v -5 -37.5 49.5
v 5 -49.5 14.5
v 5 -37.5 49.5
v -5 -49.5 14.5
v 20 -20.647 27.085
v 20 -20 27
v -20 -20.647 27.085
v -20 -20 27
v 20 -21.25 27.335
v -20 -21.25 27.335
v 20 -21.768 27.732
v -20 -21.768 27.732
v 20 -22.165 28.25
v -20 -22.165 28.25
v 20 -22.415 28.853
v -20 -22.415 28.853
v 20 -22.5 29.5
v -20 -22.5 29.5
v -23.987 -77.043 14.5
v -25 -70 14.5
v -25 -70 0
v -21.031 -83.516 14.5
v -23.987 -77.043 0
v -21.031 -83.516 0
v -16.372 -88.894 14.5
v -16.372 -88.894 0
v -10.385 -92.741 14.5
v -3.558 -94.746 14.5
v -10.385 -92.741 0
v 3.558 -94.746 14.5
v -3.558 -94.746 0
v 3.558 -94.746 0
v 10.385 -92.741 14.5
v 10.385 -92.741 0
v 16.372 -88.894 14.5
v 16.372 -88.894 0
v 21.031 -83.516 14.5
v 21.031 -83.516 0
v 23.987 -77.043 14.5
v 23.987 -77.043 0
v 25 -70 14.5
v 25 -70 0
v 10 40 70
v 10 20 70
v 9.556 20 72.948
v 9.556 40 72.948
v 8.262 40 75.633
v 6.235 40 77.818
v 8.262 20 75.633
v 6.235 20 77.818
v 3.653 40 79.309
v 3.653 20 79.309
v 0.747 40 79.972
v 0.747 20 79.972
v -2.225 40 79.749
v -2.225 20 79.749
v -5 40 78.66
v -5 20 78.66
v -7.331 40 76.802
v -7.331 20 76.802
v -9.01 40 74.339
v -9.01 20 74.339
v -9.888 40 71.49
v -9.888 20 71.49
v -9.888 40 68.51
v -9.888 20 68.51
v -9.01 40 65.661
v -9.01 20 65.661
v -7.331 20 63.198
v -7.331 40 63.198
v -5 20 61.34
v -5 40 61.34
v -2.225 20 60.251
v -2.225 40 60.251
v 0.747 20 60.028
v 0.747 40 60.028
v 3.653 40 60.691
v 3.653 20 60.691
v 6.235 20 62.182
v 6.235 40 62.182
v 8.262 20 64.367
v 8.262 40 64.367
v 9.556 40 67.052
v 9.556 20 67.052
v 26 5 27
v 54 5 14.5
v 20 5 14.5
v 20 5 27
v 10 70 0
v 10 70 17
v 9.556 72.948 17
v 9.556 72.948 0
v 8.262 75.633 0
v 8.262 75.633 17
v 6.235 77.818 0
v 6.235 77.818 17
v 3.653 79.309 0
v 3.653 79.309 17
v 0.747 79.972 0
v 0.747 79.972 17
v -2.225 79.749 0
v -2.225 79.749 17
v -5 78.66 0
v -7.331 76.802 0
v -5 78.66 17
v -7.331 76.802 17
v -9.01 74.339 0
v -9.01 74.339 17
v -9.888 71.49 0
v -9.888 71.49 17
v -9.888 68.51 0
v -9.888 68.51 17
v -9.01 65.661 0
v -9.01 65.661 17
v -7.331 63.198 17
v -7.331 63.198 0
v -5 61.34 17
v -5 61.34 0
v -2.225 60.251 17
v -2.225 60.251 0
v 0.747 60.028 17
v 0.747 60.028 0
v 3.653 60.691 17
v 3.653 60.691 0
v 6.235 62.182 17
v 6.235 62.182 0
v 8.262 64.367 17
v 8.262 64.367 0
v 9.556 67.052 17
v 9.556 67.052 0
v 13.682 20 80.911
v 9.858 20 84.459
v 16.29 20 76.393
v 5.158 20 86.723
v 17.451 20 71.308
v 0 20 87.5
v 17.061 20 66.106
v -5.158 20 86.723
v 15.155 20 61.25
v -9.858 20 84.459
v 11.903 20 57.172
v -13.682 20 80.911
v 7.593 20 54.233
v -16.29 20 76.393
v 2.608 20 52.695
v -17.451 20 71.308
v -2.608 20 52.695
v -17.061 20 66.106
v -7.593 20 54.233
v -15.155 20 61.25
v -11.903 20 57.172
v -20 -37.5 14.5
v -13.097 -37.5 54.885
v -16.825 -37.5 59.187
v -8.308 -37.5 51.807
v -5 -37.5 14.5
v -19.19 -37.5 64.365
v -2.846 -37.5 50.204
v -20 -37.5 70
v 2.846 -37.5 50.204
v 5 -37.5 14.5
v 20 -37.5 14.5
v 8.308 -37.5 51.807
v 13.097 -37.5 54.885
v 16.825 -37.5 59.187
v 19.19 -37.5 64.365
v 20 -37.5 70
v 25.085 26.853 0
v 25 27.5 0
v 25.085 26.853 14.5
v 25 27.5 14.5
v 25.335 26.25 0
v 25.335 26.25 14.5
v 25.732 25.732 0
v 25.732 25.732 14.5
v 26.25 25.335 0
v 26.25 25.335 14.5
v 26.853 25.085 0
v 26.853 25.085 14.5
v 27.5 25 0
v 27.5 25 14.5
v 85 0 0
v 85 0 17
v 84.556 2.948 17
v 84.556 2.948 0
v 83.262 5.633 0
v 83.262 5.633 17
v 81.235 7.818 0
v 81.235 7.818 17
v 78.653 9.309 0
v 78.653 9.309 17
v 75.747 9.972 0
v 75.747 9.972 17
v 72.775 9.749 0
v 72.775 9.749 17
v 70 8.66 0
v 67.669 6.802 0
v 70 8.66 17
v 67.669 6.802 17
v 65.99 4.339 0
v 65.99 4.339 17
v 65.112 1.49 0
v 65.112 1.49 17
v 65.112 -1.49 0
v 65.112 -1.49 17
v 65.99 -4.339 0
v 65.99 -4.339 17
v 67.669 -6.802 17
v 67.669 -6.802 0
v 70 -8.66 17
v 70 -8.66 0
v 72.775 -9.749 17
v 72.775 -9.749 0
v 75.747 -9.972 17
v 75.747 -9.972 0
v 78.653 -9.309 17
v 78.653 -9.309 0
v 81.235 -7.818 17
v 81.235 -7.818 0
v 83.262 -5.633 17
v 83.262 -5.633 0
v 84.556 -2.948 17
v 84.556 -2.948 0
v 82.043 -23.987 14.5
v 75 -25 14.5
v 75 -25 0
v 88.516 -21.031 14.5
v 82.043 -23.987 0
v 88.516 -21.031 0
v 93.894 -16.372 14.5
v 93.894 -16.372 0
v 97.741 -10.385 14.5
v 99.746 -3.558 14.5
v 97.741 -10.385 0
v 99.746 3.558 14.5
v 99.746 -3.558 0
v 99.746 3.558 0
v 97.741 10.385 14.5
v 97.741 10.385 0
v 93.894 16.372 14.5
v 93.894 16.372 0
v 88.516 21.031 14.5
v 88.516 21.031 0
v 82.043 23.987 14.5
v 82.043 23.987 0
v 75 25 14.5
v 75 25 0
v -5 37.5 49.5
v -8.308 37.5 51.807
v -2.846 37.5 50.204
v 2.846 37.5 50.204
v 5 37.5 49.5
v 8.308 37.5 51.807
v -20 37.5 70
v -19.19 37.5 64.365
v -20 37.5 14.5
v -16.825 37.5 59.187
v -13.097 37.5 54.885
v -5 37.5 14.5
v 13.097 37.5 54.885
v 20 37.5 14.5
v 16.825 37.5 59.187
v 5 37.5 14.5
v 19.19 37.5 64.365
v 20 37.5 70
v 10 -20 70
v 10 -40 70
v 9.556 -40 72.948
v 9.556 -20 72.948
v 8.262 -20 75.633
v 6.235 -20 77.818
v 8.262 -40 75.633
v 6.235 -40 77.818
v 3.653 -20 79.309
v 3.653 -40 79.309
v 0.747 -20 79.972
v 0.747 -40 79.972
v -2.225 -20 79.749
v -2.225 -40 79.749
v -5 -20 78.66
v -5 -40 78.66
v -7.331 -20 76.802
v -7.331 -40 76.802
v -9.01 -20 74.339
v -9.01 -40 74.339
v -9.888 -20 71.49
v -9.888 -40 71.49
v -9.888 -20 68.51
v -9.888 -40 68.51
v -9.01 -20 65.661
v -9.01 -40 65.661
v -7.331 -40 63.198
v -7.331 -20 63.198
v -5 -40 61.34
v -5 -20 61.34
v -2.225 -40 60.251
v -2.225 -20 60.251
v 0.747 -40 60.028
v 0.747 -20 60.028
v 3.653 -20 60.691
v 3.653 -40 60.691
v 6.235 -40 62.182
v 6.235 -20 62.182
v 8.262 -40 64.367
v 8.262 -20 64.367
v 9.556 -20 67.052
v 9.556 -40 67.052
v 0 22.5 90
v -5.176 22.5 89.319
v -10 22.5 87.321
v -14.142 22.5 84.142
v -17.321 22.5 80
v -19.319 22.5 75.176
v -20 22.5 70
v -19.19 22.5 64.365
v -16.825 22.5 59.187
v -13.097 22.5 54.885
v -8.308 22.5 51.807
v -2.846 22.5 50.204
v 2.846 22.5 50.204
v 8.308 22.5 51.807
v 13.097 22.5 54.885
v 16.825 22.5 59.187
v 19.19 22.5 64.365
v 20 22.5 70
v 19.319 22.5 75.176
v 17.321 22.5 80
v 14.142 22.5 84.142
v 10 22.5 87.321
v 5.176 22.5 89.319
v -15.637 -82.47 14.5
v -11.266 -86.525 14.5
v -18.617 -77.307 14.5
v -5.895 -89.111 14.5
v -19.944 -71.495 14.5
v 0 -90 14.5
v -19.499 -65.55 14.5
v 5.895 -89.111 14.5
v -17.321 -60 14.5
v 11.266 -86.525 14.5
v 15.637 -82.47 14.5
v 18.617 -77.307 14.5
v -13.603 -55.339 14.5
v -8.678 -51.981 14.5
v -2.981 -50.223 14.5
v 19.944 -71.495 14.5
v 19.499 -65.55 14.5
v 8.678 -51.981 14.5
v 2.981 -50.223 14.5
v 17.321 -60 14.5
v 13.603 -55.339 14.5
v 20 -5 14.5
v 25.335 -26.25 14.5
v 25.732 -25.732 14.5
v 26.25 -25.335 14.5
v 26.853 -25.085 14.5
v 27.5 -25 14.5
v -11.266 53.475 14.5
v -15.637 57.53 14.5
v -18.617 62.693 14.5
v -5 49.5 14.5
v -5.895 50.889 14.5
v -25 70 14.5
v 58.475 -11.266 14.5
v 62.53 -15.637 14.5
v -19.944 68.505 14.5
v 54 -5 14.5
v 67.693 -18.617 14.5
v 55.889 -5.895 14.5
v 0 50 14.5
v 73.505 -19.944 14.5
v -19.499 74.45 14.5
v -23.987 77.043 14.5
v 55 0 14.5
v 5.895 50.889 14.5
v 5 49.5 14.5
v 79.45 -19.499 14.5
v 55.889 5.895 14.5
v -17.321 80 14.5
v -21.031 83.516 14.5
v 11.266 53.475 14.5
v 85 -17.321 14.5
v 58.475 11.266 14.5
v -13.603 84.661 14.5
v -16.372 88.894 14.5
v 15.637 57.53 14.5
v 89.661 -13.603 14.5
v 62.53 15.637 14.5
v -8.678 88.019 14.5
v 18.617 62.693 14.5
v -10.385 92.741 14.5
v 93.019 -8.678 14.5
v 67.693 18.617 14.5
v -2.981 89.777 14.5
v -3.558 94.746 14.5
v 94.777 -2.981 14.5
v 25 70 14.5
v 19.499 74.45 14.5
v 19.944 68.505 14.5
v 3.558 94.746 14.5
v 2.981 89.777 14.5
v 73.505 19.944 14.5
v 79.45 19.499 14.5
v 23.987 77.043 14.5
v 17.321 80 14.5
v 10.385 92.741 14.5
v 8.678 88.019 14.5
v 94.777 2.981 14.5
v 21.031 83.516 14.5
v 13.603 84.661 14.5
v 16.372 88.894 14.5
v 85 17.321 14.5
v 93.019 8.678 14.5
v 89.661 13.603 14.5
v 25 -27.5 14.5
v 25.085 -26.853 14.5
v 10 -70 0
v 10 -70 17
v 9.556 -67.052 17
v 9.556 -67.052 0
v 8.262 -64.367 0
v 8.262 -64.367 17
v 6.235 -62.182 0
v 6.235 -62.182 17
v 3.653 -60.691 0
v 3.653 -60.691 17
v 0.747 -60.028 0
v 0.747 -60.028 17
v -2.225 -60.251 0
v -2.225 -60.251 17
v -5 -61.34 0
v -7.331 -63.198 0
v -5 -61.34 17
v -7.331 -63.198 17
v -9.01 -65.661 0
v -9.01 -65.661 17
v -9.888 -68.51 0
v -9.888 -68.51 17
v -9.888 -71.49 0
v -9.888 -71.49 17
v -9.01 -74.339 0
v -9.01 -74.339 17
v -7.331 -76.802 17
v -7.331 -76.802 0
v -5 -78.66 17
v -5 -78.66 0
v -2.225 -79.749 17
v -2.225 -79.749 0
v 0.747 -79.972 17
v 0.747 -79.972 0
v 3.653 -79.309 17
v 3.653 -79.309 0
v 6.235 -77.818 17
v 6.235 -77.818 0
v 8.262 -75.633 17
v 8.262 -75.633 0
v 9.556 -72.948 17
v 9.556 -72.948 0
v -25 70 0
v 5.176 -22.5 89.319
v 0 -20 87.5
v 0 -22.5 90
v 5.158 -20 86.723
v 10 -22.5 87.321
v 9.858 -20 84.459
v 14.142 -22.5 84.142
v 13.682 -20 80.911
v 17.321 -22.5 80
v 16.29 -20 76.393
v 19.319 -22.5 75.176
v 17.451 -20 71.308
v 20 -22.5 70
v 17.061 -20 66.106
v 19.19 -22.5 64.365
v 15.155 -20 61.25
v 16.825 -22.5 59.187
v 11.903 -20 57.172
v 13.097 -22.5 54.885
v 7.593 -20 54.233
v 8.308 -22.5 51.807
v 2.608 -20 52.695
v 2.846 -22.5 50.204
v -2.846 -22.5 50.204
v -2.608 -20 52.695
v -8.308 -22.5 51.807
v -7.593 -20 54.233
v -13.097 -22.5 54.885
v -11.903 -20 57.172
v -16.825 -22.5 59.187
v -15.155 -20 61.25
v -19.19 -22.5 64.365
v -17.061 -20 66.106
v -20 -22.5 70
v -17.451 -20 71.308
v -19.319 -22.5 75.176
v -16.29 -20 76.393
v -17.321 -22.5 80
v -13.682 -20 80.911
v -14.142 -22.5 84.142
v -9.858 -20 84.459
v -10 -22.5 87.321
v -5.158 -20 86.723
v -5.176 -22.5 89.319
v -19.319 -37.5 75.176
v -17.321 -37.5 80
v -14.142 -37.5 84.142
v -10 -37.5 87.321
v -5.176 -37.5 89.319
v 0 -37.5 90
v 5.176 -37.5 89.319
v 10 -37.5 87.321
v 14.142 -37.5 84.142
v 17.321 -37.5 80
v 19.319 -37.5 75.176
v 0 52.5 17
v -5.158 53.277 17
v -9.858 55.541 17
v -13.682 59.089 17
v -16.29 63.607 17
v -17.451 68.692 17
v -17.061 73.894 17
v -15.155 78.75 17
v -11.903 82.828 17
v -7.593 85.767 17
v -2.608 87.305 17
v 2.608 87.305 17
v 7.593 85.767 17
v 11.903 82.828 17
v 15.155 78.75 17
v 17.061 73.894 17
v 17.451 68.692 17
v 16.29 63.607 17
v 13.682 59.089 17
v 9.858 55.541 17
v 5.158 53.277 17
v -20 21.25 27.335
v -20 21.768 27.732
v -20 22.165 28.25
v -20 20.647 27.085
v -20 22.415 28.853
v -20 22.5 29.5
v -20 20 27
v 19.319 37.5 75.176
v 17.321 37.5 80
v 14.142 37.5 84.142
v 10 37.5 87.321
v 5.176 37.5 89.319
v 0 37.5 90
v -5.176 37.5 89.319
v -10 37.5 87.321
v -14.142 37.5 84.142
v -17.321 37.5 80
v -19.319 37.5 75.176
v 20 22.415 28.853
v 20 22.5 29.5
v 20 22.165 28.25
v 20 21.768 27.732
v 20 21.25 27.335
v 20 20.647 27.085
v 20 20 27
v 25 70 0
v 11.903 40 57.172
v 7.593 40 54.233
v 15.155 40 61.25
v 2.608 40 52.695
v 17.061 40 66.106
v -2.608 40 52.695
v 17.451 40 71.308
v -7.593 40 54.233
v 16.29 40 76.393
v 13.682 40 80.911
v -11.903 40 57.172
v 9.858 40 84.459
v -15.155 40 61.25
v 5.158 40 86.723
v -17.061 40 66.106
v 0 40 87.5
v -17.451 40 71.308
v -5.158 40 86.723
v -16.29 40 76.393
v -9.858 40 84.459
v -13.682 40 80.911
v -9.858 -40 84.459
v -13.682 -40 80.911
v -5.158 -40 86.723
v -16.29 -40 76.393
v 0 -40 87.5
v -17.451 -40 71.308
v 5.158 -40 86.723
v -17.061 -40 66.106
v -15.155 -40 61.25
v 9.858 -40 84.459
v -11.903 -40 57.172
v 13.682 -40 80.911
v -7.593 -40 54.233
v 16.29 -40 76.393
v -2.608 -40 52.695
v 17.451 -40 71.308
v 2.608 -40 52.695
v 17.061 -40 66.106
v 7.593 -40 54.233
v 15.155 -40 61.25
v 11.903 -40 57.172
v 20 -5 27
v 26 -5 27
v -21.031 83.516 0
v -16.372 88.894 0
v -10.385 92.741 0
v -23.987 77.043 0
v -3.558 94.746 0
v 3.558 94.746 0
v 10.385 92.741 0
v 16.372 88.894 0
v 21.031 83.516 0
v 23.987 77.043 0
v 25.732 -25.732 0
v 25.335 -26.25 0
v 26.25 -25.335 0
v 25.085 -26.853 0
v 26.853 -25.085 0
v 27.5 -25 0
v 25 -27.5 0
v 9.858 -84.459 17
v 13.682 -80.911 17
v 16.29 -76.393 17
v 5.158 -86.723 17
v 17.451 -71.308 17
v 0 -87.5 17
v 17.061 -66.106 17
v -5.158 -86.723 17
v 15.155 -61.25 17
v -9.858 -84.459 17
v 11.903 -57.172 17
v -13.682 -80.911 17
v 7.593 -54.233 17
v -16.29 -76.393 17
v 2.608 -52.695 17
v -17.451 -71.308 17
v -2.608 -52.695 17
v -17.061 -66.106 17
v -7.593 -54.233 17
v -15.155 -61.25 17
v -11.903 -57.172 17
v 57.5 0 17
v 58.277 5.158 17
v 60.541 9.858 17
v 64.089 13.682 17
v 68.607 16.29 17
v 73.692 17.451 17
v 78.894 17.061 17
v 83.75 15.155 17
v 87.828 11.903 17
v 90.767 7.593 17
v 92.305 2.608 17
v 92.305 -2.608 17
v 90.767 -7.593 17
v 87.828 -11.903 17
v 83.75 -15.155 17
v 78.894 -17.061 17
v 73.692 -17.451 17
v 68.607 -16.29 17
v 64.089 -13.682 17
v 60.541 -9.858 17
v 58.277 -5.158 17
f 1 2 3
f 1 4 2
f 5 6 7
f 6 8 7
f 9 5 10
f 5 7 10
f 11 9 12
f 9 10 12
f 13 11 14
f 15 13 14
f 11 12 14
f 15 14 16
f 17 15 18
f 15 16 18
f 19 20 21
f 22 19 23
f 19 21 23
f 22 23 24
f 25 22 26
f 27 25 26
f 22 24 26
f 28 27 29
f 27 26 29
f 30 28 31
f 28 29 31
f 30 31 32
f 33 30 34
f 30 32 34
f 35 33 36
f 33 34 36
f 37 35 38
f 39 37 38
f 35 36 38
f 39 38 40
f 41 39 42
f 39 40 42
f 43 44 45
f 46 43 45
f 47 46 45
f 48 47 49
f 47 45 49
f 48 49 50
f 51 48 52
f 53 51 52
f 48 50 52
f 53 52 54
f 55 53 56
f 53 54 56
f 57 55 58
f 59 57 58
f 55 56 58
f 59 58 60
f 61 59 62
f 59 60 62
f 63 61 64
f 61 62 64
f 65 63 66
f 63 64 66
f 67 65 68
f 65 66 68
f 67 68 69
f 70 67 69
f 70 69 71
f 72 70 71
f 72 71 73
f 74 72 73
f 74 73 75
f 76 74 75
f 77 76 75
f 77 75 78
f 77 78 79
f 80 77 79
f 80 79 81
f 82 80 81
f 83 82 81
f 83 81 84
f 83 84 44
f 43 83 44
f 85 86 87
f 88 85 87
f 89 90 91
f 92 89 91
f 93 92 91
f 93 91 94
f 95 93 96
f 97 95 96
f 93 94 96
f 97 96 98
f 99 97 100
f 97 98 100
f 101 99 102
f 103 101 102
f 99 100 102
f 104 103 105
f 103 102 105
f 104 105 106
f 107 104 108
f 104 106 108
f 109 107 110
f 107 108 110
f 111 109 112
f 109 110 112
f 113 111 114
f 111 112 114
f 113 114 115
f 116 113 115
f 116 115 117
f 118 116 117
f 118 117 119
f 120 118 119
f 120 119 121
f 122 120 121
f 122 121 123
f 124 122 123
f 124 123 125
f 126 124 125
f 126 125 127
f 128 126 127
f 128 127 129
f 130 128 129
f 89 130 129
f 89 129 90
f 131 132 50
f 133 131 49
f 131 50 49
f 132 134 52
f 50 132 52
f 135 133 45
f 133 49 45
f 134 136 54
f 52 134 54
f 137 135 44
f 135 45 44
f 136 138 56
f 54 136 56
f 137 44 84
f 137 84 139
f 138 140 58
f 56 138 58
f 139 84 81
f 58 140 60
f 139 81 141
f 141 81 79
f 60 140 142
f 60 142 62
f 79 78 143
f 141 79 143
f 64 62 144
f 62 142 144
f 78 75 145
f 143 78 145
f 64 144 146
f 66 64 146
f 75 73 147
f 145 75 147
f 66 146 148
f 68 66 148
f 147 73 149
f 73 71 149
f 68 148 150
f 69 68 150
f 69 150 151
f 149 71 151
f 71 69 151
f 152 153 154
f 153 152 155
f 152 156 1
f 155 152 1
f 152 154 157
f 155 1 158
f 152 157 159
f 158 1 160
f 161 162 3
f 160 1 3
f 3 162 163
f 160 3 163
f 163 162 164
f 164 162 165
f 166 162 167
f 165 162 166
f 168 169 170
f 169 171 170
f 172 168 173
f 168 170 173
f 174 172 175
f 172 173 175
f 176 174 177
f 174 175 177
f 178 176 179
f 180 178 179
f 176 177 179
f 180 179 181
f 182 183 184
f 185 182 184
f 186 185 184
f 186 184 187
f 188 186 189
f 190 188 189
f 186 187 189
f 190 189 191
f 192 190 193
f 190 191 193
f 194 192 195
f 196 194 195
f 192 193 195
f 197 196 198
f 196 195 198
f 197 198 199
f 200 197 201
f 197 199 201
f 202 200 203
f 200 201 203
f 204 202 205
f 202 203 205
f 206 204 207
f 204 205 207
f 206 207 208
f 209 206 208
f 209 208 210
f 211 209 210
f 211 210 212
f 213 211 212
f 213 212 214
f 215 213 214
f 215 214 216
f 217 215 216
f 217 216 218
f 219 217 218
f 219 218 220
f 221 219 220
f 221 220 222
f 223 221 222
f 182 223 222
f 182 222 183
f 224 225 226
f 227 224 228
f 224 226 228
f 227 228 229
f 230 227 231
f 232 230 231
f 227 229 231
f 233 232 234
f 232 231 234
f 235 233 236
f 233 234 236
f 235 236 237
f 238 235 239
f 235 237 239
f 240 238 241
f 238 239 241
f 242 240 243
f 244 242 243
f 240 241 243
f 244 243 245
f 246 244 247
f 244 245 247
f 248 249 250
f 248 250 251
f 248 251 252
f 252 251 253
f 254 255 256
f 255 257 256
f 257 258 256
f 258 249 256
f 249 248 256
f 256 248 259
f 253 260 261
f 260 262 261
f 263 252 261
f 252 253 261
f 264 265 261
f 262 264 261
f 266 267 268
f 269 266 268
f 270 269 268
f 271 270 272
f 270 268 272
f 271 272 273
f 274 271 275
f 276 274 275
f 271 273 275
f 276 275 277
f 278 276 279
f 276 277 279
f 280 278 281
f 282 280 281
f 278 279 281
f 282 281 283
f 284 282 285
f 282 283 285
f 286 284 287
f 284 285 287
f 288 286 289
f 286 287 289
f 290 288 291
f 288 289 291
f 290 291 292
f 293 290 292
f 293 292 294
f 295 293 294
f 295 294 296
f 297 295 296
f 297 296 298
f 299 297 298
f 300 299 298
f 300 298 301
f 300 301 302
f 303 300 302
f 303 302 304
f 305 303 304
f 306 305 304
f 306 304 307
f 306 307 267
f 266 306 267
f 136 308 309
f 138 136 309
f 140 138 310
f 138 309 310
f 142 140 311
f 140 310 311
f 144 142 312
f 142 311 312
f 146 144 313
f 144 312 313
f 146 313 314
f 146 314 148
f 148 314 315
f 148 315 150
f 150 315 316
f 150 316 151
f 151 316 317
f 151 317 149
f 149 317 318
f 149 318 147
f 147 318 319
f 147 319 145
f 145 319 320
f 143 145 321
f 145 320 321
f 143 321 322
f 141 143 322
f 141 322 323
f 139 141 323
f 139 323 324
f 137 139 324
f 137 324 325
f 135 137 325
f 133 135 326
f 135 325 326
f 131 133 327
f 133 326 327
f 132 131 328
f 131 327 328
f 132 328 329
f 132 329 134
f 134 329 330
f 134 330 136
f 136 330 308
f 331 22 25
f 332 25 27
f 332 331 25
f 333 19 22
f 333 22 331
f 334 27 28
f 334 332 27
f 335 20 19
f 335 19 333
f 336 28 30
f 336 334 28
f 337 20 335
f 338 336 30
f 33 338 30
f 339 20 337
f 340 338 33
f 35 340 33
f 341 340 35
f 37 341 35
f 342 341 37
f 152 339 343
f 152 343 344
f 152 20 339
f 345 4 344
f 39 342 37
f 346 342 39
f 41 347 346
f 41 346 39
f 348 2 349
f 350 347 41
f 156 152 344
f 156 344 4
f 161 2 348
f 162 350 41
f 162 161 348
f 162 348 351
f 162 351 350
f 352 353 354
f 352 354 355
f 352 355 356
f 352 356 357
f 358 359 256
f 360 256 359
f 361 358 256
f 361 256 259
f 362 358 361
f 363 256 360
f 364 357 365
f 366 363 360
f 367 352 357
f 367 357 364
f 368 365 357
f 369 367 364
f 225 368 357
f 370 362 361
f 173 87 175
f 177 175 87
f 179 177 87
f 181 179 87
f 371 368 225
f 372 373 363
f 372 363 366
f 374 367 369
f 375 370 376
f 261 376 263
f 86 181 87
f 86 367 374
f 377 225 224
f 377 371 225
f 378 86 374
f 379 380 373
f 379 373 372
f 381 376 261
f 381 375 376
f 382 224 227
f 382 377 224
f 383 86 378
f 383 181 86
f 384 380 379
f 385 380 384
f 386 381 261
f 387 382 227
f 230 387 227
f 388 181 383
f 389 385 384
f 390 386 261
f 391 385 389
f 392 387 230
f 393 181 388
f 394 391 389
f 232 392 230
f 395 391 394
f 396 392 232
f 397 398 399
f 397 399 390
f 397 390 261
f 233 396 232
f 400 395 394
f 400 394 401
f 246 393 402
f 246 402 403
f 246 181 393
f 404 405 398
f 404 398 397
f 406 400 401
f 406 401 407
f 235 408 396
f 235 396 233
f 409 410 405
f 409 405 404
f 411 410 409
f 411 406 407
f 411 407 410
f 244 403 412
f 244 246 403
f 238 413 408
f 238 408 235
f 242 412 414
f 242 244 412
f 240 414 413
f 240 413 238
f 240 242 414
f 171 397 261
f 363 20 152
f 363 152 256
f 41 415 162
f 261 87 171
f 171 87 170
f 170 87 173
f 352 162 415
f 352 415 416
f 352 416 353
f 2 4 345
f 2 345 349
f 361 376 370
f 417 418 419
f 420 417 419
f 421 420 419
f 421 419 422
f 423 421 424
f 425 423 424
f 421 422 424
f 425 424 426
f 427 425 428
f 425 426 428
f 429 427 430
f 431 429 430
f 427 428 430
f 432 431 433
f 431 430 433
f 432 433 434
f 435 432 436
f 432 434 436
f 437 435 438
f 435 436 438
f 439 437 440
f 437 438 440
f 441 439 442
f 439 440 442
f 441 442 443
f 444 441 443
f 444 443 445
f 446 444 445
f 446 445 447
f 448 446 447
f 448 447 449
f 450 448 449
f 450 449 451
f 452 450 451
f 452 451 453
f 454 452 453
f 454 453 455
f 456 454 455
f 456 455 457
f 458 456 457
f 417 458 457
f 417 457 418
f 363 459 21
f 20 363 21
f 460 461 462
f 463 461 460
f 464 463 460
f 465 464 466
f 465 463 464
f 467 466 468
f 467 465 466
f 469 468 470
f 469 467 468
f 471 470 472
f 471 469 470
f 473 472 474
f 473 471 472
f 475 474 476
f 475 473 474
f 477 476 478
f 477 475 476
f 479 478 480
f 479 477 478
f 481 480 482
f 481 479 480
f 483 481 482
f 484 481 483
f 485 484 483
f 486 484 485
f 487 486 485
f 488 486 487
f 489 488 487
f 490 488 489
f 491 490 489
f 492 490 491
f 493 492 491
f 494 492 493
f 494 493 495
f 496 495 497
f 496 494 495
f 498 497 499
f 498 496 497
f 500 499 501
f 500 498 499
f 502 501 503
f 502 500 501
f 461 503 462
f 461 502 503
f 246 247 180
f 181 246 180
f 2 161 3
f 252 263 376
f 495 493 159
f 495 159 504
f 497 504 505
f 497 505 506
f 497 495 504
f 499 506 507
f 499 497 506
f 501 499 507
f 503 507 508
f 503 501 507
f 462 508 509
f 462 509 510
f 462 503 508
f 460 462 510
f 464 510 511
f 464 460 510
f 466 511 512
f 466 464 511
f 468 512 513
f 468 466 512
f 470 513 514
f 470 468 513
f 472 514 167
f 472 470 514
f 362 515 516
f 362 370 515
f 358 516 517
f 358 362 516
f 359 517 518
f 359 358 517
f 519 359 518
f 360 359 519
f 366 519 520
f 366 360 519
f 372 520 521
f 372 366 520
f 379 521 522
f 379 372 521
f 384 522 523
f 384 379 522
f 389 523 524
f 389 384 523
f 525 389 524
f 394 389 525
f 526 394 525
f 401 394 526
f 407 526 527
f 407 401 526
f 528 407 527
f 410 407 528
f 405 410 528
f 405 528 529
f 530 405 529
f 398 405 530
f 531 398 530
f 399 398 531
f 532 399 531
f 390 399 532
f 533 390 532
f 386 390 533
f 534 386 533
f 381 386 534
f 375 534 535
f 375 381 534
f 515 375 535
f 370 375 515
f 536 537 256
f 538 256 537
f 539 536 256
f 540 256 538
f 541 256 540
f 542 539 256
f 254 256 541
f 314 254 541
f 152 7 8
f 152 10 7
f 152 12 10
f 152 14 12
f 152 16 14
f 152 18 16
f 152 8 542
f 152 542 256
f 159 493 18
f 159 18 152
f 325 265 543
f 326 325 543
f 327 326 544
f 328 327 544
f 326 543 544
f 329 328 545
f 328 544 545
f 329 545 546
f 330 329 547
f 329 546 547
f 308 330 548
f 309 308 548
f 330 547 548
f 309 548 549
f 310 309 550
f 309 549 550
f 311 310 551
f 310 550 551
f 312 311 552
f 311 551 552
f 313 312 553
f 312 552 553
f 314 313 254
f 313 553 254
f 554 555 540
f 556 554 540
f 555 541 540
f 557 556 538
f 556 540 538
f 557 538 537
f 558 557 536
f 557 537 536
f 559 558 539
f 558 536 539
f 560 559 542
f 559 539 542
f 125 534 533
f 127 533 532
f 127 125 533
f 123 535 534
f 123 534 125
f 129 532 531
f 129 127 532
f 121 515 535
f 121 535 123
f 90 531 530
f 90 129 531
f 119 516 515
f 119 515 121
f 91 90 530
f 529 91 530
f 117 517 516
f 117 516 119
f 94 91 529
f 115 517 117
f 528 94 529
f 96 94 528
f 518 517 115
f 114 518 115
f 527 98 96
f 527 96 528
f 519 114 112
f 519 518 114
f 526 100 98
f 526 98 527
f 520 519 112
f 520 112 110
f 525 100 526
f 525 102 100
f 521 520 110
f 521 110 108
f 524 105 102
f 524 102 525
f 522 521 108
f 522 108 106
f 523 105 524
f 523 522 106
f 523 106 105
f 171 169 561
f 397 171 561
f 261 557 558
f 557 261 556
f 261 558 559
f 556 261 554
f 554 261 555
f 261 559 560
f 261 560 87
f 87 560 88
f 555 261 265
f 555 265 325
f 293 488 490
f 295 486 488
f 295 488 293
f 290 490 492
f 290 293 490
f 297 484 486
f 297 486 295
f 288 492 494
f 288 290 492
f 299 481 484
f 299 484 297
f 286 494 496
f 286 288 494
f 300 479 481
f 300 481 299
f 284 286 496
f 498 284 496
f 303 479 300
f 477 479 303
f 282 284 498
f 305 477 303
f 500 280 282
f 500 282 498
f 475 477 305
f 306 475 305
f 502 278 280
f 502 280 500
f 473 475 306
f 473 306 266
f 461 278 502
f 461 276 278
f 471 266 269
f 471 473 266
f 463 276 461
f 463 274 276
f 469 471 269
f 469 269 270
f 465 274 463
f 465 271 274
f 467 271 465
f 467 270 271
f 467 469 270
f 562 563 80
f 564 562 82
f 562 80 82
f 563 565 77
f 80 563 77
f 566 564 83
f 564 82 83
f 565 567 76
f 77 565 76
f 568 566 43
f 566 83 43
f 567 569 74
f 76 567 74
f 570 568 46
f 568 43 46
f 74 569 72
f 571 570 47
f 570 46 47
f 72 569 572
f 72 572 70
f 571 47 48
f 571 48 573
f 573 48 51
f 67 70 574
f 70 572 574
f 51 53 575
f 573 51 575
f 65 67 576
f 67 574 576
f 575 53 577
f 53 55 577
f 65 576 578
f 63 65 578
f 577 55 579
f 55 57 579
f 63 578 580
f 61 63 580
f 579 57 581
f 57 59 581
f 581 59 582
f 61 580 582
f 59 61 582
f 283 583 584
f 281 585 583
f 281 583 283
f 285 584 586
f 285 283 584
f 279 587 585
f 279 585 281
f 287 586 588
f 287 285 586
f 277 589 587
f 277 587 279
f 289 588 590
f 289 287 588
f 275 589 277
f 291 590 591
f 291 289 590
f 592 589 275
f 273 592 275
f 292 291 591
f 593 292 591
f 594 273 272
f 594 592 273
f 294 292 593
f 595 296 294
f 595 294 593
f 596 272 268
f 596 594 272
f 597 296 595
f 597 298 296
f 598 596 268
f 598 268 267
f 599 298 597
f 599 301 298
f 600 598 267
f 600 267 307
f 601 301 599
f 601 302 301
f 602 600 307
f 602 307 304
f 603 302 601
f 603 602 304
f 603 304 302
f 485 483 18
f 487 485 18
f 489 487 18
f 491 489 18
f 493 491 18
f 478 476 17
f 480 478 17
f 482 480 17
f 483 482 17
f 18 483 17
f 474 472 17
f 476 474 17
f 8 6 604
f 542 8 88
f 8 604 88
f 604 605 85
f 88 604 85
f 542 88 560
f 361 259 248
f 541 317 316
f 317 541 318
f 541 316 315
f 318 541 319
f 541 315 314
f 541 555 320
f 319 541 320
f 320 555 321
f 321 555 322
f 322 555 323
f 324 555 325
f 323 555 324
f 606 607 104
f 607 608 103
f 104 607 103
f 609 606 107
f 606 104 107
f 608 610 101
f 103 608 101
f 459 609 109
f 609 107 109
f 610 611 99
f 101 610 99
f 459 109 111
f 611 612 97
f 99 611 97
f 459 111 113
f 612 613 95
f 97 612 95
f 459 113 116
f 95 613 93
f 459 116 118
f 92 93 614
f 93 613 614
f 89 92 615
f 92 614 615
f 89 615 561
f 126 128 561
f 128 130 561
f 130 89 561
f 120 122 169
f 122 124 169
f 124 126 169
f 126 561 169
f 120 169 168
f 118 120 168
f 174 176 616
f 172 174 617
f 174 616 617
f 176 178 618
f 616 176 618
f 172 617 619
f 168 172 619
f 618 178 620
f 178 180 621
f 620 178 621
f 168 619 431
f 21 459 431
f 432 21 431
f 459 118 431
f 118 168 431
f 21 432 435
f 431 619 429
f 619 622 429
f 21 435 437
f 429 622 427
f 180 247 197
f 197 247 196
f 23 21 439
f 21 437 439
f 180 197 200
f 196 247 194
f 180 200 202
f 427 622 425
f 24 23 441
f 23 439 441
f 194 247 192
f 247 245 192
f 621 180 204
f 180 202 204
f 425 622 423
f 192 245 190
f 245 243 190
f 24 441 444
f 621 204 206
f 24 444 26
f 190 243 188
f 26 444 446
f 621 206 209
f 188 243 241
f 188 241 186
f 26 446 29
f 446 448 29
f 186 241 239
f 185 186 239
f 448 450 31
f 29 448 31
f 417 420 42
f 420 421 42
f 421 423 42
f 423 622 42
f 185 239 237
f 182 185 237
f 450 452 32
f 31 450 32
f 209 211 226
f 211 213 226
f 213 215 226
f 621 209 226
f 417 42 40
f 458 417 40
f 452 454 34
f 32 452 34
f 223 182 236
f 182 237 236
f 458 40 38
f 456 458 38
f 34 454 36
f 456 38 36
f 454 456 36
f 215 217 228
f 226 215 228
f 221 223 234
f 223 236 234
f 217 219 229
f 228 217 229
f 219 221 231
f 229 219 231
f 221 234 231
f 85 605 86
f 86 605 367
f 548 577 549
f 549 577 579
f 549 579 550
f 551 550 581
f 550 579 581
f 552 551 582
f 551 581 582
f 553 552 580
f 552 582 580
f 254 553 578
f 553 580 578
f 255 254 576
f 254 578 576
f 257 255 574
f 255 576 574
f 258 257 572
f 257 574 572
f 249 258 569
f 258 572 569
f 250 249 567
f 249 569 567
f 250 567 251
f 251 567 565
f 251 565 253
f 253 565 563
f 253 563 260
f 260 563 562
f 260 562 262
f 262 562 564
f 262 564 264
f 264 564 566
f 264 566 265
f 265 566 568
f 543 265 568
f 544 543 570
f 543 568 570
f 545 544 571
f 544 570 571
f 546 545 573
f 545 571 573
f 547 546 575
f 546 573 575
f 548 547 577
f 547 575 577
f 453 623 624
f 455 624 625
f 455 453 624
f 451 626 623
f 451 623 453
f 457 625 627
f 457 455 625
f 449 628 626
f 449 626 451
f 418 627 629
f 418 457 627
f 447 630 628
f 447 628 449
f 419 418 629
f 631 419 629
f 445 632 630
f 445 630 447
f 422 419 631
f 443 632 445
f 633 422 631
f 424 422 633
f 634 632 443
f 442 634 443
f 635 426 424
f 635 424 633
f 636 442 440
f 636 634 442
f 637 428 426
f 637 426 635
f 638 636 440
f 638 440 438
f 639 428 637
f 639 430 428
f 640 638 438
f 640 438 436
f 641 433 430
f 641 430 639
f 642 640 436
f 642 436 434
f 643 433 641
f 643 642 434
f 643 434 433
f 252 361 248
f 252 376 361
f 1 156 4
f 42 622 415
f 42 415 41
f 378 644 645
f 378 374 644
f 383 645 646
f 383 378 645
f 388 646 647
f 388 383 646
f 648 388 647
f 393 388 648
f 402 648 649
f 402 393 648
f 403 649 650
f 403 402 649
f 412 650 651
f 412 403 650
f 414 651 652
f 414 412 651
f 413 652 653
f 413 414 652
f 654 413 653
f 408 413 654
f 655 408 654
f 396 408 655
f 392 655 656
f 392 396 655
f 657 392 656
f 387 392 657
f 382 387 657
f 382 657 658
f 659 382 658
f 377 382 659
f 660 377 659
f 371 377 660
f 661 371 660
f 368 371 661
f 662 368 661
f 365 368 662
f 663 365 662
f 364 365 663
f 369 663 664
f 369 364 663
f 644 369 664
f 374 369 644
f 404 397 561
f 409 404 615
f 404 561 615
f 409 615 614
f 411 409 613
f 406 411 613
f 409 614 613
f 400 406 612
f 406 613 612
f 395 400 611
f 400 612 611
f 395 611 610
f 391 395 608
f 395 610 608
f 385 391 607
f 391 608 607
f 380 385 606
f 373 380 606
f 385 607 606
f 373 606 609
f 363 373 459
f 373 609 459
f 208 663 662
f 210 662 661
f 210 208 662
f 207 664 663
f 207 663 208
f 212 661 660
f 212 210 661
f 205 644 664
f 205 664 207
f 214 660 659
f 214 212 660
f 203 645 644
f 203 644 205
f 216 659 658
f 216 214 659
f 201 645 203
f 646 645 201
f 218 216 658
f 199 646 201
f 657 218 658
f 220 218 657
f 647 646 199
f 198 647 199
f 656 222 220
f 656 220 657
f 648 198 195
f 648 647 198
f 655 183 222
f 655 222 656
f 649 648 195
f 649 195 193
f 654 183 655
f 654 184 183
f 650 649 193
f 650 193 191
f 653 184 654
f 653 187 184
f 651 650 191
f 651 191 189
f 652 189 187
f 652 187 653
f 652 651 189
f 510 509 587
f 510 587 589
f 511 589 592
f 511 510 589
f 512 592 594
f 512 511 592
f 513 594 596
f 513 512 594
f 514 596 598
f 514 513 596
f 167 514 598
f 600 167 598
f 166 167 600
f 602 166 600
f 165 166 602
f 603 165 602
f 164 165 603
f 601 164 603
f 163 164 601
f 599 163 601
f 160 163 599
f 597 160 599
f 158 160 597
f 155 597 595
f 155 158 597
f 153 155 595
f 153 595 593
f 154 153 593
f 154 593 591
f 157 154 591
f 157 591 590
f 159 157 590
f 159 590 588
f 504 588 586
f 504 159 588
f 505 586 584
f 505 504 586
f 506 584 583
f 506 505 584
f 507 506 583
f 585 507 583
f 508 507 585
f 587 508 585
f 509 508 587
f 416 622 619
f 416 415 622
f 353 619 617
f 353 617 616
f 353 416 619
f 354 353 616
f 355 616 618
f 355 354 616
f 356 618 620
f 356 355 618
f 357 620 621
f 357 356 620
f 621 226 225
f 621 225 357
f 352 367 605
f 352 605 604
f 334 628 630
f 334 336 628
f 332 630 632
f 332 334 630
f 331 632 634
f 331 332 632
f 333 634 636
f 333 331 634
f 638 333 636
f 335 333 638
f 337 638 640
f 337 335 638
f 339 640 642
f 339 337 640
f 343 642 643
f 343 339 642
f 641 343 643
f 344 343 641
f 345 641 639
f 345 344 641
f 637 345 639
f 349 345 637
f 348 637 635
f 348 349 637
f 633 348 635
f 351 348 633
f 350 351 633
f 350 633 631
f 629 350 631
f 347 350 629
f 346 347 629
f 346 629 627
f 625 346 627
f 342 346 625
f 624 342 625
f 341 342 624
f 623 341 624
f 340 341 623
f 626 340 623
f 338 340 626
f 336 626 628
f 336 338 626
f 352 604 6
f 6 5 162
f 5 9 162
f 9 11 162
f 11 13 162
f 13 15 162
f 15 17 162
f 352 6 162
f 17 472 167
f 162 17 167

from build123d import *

# Parameters (mm, degrees)
PAD_DEPTH       = 14.5
PAD001_DEPTH    = 20
PAD002_DEPTH    = 5
PAD003_DEPTH    = 5
SKETCH009_R     = 10
POCKET_DEPTH    = 135.001
SKETCH010_R     = 10
POCKET001_DEPTH = 17.001
FILLET_R        = 2.5


with BuildPart() as part:
    # Sketch → Pad (new body)
    with BuildSketch(Plane.XY):
        with BuildLine():
            Line((-25, 70), (-25, -70))
            ThreePointArc((-25, -70), (0, -95), (25, -70))
            Line((25, -25), (25, -70))
            Line((75, -25), (25, -25))
            ThreePointArc((75, -25), (100, 0), (75, 25))
            Line((75, 25), (25, 25))
            Line((25, 25), (25, 70))
            ThreePointArc((25, 70), (0, 95), (-25, 70))
        make_face()
    extrude(amount=PAD_DEPTH)

    # Sketch001 → Pad001 (join, symmetric)
    with BuildSketch(Plane.YZ):
        Polygon((-37.5, 0), (-37.5, 70), (-22.5, 70), (-22.5, 27), (22.5, 27), (22.5, 70), (37.5, 70), (37.5, 0), align=None)
    extrude(amount=PAD001_DEPTH, both=True)

    # Sketch002 → Pad002 (join, symmetric)
    with BuildSketch(Plane.YZ):
        Polygon((-37.5, 49.5), (-37.5, 14.5), (-49.5, 14.5), align=None)
        Polygon((37.5, 49.5), (37.5, 14.5), (49.5, 14.5), align=None)
    extrude(amount=PAD002_DEPTH, both=True)

    # Sketch003 → Pad003 (join, symmetric)
    with BuildSketch(Plane.XZ):
        Polygon((20, 14.5), (20, 27), (26, 27), (54, 14.5), align=None)
    extrude(amount=PAD003_DEPTH, both=True)

    # Sketch004 → Revolution (revolve)
    with BuildSketch(Plane.YZ):
        Polygon((-40, 70), (-40, 87.5), (-37.5, 90), (-22.5, 90), (-20, 87.5), (-20, 70), align=None)
    revolve(axis=Axis((0, -20, 70), (0, 1, 0)))

    # Sketch005 → Revolution001 (revolve)
    with BuildSketch(Plane.YZ):
        Polygon((20, 70), (20, 87.5), (22.5, 90), (37.5, 90), (40, 87.5), (40, 70), align=None)
    revolve(axis=Axis((0, 20, 70), (0, -1, 0)))

    # Sketch006 → Revolution002 (revolve)
    with BuildSketch(Plane.YZ):
        Polygon((-90, 14.5), (-70, 14.5), (-70, 17), (-87.5, 17), align=None)
    revolve(axis=Axis((0, -70, 14.5), (0, 0, -1)))

    # Sketch007 → Revolution003 (revolve)
    with BuildSketch(Plane.YZ):
        Polygon((50, 14.5), (70, 14.5), (70, 17), (52.5, 17), align=None)
    revolve(axis=Axis((0, 70, 14.5), (0, 0, -1)))

    # Sketch008 → Revolution004 (revolve)
    with BuildSketch(Plane.XZ):
        Polygon((55, 14.5), (75, 14.5), (75, 17), (57.5, 17), align=None)
    revolve(axis=Axis((75, 0, 14.5), (0, 0, -1)))

    # Sketch009 (on Face38 of Revolution004) → Pocket (cut, through all)
    with BuildSketch(Plane.XZ.offset(40)):
        with Locations((0, 70)):
            Circle(SKETCH009_R)
    extrude(amount=-POCKET_DEPTH, mode=Mode.SUBTRACT)

    # Sketch010 (on Face37 of Pocket) → Pocket001 (cut, through all)
    with BuildSketch(Plane.XY.offset(17)):
        with Locations((0, 70)):
            Circle(SKETCH010_R)
        with Locations((75, 0)):
            Circle(SKETCH010_R)
        with Locations((0, -70)):
            Circle(SKETCH010_R)
    extrude(amount=-POCKET001_DEPTH, mode=Mode.SUBTRACT)

    # Fillet
    fillet_edges = [part.edges().sort_by_distance(p)[0] for p in [
        (25, -25, 7.25),
        (25, 25, 7.25),
        (0, 22.5, 27),
        (0, -22.5, 27),
    ]]
    fillet(fillet_edges, radius=FILLET_R)


solid = part.part
